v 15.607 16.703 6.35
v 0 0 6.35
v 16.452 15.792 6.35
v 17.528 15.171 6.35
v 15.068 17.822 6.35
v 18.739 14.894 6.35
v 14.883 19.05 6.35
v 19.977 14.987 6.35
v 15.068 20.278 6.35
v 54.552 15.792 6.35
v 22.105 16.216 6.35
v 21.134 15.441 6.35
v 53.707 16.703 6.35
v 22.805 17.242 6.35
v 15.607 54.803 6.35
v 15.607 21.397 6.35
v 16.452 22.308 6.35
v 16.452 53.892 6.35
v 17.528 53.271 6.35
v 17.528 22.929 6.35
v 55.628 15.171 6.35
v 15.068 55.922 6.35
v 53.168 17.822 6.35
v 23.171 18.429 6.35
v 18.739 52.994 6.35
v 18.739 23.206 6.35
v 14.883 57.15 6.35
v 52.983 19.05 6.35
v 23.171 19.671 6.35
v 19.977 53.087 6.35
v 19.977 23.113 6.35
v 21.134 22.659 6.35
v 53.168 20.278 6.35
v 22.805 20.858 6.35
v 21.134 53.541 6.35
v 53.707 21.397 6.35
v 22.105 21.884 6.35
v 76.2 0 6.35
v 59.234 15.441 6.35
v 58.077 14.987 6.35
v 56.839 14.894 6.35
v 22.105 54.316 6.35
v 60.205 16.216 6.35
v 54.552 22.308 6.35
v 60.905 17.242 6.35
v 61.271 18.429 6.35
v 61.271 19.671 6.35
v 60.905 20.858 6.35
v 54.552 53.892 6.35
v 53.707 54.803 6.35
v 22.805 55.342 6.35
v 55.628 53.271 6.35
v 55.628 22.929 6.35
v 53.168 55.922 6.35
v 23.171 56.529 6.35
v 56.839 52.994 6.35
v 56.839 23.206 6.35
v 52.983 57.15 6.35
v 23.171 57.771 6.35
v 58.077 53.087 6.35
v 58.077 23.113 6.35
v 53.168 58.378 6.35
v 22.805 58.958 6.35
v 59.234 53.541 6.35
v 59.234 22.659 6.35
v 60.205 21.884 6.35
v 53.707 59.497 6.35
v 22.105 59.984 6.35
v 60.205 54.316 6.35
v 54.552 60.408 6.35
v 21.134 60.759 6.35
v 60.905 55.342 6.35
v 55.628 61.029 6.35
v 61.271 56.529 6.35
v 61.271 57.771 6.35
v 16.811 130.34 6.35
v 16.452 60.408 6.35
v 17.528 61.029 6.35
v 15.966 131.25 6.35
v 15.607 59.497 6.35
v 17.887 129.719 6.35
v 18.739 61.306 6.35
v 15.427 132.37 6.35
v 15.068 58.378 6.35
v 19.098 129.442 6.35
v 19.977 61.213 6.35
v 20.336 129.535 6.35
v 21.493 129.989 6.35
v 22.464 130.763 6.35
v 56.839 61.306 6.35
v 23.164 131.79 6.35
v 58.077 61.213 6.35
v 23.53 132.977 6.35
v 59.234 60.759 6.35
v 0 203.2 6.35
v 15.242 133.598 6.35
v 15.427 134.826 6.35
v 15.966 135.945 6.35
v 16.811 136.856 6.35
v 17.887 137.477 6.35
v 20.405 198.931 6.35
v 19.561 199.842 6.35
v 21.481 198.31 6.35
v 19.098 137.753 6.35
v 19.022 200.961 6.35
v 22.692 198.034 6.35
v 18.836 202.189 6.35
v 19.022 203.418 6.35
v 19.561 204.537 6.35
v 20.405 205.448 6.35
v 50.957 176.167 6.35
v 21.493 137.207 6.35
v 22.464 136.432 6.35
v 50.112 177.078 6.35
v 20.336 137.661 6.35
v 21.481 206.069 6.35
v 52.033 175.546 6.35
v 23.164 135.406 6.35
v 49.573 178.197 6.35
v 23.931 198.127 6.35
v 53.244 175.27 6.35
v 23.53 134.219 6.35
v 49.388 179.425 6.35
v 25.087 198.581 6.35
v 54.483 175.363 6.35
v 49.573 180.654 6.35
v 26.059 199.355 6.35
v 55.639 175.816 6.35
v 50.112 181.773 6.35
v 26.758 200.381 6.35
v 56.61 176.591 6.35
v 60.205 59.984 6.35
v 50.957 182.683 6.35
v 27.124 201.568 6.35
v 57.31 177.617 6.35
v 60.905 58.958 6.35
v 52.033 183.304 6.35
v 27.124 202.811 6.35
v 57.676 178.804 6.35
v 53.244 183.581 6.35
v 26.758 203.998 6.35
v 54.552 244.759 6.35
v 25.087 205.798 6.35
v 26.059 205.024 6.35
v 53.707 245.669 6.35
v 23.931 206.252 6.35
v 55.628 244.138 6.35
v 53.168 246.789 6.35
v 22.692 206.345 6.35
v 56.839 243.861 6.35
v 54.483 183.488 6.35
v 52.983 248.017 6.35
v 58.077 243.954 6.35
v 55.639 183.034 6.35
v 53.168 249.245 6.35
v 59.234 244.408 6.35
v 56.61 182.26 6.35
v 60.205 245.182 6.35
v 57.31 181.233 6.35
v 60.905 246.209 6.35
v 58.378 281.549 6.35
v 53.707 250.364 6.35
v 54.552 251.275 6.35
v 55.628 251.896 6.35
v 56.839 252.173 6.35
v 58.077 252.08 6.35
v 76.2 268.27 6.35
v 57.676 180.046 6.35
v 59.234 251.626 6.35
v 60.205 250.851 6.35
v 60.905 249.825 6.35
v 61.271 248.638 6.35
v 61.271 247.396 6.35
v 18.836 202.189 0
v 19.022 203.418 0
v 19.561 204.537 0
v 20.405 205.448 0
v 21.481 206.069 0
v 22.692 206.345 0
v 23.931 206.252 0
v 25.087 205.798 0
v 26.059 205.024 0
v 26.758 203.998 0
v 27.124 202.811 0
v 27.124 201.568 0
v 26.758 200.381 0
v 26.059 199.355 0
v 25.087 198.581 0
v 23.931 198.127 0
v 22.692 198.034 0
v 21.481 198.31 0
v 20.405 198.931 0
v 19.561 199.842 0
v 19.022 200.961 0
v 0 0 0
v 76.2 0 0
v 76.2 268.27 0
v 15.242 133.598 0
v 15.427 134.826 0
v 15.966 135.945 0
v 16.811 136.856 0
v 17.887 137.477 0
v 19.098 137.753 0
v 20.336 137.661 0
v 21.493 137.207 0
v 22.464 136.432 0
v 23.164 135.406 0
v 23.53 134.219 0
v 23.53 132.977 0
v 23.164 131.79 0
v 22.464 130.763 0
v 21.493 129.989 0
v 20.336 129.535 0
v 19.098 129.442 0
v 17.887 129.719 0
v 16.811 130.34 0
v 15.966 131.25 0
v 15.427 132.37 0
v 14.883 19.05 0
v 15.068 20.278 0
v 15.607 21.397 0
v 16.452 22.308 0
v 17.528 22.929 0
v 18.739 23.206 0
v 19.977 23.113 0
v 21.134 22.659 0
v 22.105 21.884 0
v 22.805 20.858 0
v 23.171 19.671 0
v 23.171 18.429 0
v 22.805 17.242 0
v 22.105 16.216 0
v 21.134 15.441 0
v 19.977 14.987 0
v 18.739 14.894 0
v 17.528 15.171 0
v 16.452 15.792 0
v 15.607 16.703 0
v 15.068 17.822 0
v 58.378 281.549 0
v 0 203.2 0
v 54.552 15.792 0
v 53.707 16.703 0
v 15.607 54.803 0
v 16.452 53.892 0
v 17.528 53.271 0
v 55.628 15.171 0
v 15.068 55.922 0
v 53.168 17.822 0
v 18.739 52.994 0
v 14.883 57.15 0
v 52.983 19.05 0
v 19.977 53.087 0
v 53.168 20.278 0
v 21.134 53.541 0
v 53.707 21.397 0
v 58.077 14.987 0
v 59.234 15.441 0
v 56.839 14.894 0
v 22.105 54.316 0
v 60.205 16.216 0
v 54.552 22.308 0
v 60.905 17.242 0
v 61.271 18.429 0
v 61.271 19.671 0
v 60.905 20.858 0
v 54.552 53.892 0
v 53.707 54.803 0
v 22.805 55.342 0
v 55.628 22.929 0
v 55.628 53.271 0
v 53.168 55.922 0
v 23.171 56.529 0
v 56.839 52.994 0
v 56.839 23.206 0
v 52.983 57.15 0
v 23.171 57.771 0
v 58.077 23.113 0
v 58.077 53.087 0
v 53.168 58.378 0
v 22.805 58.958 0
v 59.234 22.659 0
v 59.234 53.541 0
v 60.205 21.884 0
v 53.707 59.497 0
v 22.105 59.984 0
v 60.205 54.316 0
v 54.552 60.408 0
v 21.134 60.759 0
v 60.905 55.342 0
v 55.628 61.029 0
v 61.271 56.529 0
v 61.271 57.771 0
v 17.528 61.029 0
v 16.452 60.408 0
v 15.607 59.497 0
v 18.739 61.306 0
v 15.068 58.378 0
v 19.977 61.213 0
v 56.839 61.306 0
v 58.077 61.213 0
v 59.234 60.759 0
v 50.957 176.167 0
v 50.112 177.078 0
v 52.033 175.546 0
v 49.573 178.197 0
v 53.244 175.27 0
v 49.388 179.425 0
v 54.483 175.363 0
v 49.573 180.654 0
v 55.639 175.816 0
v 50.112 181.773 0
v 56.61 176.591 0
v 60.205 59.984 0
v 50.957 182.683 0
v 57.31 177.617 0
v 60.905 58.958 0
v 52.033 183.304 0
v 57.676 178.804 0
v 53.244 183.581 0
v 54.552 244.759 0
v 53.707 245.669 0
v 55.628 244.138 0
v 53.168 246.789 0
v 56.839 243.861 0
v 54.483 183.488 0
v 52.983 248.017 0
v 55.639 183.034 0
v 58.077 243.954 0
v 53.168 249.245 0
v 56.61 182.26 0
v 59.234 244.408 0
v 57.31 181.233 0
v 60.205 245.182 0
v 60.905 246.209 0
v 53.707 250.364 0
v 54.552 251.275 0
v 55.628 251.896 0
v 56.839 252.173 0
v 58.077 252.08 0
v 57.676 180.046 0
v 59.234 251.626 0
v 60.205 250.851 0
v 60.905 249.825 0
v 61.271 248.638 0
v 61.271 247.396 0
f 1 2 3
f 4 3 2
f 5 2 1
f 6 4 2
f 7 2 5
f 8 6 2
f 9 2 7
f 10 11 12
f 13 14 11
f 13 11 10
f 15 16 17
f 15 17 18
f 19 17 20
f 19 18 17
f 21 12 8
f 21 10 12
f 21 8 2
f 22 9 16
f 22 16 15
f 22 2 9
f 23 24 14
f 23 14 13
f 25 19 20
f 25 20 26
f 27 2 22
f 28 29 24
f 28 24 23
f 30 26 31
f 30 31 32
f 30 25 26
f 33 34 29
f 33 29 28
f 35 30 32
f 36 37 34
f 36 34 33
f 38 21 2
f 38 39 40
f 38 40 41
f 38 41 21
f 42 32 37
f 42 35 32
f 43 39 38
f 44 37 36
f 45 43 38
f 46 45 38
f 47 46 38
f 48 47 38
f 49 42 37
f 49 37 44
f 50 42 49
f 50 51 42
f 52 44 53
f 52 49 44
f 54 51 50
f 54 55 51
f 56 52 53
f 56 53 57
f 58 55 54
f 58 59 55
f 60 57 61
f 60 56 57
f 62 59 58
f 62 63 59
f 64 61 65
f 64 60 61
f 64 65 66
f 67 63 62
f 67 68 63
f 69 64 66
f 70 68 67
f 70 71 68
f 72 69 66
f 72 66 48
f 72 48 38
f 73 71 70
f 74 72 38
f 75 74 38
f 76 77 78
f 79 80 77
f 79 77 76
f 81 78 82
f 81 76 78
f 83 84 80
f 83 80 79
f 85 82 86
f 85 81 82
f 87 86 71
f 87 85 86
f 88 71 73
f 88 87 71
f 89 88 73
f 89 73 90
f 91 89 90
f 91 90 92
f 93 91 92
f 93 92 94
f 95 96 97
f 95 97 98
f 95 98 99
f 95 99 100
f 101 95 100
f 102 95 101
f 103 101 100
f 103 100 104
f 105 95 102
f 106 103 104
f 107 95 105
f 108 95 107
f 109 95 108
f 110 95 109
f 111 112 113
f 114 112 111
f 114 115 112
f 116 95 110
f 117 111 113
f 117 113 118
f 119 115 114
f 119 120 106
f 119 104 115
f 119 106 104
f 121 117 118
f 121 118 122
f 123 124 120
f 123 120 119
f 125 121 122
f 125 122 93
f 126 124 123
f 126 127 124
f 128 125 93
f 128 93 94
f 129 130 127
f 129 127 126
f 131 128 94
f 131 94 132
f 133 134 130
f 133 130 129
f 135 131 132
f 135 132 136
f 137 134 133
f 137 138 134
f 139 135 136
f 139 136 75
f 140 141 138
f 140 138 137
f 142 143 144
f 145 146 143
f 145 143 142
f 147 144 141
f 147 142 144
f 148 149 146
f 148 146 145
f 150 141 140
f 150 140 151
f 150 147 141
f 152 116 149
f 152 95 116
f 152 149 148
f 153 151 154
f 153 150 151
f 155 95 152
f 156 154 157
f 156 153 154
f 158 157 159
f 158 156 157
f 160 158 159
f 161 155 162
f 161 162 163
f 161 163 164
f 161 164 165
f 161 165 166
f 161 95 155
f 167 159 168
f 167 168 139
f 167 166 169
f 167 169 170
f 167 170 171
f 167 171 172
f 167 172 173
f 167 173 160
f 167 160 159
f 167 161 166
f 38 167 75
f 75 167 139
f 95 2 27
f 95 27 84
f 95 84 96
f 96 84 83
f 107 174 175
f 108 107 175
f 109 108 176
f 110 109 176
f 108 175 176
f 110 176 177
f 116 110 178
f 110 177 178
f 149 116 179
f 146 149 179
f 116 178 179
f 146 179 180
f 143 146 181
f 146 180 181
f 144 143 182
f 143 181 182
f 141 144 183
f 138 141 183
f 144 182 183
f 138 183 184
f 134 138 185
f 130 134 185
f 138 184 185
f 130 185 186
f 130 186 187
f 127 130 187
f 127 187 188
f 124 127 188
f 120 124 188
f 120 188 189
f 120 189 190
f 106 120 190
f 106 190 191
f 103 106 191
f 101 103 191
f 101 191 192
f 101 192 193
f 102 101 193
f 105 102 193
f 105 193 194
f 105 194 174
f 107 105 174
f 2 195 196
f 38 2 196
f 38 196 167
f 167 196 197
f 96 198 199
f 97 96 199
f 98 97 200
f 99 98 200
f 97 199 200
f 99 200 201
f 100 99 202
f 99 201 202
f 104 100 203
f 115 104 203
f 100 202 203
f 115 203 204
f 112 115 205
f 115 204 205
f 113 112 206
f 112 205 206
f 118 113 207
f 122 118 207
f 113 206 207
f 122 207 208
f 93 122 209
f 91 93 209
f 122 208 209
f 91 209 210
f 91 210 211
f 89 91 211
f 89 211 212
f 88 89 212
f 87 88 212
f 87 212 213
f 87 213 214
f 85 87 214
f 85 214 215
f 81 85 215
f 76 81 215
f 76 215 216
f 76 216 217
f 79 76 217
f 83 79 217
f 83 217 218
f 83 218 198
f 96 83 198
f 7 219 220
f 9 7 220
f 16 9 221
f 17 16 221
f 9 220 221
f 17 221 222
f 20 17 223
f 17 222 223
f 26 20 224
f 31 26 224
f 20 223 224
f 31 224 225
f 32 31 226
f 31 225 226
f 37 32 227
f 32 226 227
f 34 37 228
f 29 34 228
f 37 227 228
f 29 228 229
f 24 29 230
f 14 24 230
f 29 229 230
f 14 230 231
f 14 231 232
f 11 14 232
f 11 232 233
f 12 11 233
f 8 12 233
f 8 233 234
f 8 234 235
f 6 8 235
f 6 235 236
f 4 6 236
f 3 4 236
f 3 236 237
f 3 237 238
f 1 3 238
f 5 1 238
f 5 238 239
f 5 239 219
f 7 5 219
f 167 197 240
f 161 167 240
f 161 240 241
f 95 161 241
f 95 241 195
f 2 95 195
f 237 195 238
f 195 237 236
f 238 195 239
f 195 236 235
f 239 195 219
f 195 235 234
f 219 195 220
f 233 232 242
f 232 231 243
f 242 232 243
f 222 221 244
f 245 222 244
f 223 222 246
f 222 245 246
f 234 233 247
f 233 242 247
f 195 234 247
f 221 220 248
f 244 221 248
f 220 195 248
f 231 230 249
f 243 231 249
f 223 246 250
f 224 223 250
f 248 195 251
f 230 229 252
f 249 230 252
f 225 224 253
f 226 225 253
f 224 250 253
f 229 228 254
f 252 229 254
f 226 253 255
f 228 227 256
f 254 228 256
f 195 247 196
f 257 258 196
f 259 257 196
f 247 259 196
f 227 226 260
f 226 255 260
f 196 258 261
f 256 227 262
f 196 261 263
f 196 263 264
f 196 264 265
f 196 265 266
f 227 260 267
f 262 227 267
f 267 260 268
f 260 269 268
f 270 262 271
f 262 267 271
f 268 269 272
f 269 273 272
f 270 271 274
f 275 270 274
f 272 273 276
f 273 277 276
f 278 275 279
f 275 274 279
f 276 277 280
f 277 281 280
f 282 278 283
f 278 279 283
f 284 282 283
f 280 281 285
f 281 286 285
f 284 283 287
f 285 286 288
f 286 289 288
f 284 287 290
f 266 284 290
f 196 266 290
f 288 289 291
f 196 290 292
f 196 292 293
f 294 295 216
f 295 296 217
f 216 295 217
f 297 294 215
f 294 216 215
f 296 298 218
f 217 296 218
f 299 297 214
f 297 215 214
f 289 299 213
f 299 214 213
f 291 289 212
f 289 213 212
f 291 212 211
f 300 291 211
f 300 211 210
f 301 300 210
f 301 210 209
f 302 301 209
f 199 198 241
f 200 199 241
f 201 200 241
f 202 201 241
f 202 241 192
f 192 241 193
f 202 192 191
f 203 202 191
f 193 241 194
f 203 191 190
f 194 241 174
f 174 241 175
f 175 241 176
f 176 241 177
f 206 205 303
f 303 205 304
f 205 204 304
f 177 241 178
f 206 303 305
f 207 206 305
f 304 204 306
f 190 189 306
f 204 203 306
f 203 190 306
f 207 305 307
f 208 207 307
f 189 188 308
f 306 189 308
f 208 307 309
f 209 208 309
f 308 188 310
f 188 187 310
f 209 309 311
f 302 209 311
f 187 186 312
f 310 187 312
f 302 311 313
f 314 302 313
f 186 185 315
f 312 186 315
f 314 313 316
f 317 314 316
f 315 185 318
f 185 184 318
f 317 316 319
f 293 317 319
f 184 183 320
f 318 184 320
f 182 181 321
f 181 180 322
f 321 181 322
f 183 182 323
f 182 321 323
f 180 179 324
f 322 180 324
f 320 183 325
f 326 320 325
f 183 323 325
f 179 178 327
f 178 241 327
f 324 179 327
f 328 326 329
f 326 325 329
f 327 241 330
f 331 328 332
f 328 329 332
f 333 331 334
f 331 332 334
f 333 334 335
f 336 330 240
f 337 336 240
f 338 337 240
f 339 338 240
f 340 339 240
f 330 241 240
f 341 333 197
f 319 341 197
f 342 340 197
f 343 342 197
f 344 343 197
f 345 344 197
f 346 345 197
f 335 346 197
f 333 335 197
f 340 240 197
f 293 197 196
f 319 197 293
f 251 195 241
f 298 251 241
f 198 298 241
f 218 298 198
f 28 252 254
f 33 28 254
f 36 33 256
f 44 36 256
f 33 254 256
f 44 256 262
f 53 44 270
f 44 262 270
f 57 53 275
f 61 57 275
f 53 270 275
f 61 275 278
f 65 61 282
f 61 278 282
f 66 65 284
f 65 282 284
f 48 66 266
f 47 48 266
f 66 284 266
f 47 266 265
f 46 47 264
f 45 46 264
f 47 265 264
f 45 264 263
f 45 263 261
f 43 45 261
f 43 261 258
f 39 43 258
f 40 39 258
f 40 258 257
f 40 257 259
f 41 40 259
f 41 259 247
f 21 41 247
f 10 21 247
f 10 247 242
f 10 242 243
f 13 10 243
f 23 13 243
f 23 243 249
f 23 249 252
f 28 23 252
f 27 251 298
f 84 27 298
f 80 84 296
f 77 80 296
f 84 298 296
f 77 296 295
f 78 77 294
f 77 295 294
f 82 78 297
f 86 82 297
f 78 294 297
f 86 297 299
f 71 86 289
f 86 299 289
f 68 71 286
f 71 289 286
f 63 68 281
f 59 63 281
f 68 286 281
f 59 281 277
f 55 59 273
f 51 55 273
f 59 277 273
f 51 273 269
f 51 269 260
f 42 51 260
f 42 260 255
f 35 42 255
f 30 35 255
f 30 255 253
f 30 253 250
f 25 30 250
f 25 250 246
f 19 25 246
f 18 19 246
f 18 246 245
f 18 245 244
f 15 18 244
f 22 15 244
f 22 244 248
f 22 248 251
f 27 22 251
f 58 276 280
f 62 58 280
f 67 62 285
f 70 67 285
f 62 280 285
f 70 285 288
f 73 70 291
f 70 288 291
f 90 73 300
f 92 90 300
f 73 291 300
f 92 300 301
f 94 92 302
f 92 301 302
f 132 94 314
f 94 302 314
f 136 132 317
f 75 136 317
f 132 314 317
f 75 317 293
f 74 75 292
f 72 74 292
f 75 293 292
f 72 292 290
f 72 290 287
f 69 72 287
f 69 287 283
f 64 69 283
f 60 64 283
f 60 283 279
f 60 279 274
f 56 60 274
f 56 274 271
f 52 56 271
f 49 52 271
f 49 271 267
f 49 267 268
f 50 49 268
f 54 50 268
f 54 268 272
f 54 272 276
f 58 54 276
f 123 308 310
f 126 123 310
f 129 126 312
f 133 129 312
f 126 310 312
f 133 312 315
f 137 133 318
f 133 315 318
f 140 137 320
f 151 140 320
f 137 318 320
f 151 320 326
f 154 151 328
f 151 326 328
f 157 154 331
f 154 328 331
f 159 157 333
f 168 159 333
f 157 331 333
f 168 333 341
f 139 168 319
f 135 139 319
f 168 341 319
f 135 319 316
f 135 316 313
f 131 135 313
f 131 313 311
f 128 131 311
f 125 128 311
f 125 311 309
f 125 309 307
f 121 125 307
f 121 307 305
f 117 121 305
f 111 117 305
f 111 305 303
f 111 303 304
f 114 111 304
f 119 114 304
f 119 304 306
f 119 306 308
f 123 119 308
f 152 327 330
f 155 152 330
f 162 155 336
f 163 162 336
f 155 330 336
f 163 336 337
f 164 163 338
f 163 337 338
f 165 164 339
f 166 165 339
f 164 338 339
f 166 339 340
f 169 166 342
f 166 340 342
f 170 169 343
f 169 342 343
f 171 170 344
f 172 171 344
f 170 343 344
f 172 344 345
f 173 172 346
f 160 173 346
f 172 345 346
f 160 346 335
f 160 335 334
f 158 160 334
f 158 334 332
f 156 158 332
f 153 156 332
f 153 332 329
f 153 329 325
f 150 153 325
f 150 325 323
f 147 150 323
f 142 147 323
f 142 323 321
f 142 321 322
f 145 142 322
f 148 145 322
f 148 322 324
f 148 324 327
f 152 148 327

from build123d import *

# Parameters (mm, degrees)
BOSS_EXTRUDE1_DEPTH              = 6.35
F_21_64_0_32813_DIAMETER_HOLE1_D = 8.334502
LPATTERN1_COUNT                  = 2
LPATTERN1_PITCH                  = 38.1
LPATTERN1_COUNT_DIR2             = 2
LPATTERN1_PITCH_DIR2             = 38.1
F_21_64_0_32813_DIAMETER_HOLE2_D = 8.334502
LPATTERN2_COUNT                  = 3
LPATTERN2_PITCH                  = 57.15
LPATTERN2_COUNT_DIR2             = 2
LPATTERN2_PITCH_DIR2             = 38.1


with BuildPart() as part:
    # Sketch2 → Boss-Extrude1 (new body)
    with BuildSketch(Plane.XY):
        Polygon((0, 0), (76.2, 0), (76.2, 268.269814476), (58.378218394, 281.548923082), (0, 203.2), align=None)
    extrude(amount=BOSS_EXTRUDE1_DEPTH)

    # 21/64 (0.32813) Diameter Hole1 (through all)
    with Locations(Plane.XY.offset(6.35)):
        with Locations((57.15, 19.05)):
            f_21_64_0_32813_diameter_hole1 = Hole(F_21_64_0_32813_DIAMETER_HOLE1_D / 2)

    # LPattern1: 21_64 _0.32813_ Diameter Hole1 2 × 2
    with Locations(*[(-i * LPATTERN1_PITCH, j * LPATTERN1_PITCH_DIR2, 0) for i in range(LPATTERN1_COUNT) for j in range(LPATTERN1_COUNT_DIR2) if (i, j) != (0, 0)]):
        add(f_21_64_0_32813_diameter_hole1, mode=Mode.SUBTRACT)

    # 21/64 (0.32813) Diameter Hole2 (through all)
    with Locations(Plane.XY.offset(6.35)):
        with Locations((57.15, 248.0169065)):
            f_21_64_0_32813_diameter_hole2 = Hole(F_21_64_0_32813_DIAMETER_HOLE2_D / 2)

    # LPattern2: 21_64 _0.32813_ Diameter Hole2 3 × 2, 2 skipped
    with Locations(*[Vector(-0.5974852016253348, -0.8018799372965589, 0) * (i * LPATTERN2_PITCH) + Vector(0.8018799372965594, -0.5974852016253339, 0) * (j * LPATTERN2_PITCH_DIR2) for i in range(LPATTERN2_COUNT) for j in range(LPATTERN2_COUNT_DIR2) if (i, j) not in ((0, 0), (0, 1), (2, 0))]):
        add(f_21_64_0_32813_diameter_hole2, mode=Mode.SUBTRACT)


solid = part.part
